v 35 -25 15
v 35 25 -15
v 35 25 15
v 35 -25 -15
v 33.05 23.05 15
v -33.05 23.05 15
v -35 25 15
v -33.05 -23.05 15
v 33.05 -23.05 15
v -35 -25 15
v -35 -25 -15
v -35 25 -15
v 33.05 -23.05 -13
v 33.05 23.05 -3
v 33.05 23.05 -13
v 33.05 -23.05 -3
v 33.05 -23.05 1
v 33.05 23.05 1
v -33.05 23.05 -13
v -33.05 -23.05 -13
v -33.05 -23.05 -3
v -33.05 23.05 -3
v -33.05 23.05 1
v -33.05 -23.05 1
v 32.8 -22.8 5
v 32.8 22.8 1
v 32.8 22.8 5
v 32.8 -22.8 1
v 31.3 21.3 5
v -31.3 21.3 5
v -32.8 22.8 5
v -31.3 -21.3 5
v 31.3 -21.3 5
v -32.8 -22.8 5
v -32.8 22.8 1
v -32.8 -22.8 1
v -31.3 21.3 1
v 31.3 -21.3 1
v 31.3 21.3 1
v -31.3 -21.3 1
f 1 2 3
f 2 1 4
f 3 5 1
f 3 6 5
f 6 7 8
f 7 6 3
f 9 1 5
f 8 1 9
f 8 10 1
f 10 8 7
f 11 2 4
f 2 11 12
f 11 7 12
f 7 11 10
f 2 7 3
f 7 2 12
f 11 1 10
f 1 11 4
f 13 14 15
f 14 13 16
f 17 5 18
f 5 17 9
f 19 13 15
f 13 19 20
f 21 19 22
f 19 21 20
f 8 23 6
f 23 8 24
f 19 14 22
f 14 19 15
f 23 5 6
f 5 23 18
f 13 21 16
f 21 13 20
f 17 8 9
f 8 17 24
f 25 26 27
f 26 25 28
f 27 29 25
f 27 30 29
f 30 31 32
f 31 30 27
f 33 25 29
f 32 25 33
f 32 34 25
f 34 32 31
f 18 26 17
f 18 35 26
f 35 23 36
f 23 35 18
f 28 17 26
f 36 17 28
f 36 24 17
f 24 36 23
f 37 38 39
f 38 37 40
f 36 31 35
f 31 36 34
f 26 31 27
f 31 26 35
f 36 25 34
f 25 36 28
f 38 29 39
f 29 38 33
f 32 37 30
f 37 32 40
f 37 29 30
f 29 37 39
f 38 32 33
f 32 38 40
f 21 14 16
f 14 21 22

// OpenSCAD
// --- Dimensions: Box ---
box_width = 70;          // Outer width (X)
box_depth = 50;          // Outer depth (Y)
box_height = 30;        // Outer height (Z)
box_wall_thick = 2;      // Wall thickness
box_floor_thick = 2;     // Floor thickness

// --- Dimensions: Lid ---
lid_plate_w = 70;        // Plate width (X)
lid_plate_d = 50;        // Plate depth (Y)
lid_plate_h = 2;         // Plate thickness (Z)
lid_lip_w = 65.6;        // Lip outer width (X)
lid_lip_d = 45.6;        // Lip outer depth (Y)
lid_lip_h = 4;           // Lip height (Z)
lid_lip_thick = 1.5;     // Lip wall thickness

// --- Layout ---
gap = 10;                // Gap between parts on print bed
$fn = 64;                // Smoothness for curves

// --- Part 1: The Box ---
// Positioned at origin (centered on X/Y)
translate(0, 0, 0) {
    difference() {
        // Main outer body
        cube([box_width, box_depth, box_height], center = true);
        
        // Hollow interior
        // We subtract a slightly larger cube to ensure clean cuts
        translate([0, 0, box_floor_thick])
            cube([box_width - 2*box_wall_thick + 0.1, 
                  box_depth - 2*box_wall_thick + 0.1, 
                  box_height], center = true);
    }
}

// --- Part 2: The Lid ---
// Printed upside down (Z=0 is the top surface of the lip)
// Placed on the +X side of the box with a gap
translate(box_width + gap, 0, 0) {
    // We rotate 180 on X so the plate sits on the bed (Z=0)
    // and the lip grows upwards from the plate.
    // However, the prompt says "printed upside down: a plate... lying on the bed"
    // This implies the plate is the bottom layer.
    
    union() {
        // The Plate (Base of the lid)
        cube([lid_plate_w, lid_plate_d, lid_plate_h], center = true);
        
        // The Lip (The part that slides into the box)
        // To print "upside down" with the plate on the bed, 
        // the lip must be built on top of the plate.
        // If the user meant the lip is the part touching the bed, 
        // they would have said "lip on the bed". 
        // "A plate... lying on the bed, with a rectangular lip on top of it"
        // means Plate is Z=0 to Z=2, Lip is Z=2 to Z=6.
        
        translate([0, 0, lid_plate_h/2 + lid_lip_h/2])
        difference() {
            // Outer volume of the lip
            cube([lid_lip_w, lid_lip_d, lid_lip_h], center = true);
            
            // Inner hollow of the lip
            cube([lid_lip_w - 2*lid_lip_thick, 
                  lid_lip_d - 2*lid_lip_thick, 
                  lid_lip_h + 0.1], center = true);
        }
    }
}

// Note on orientation: 
// The box is centered at 0,0,0. 
// The lid is translated to (box_width + gap, 0, 0).
// To ensure the box sits on the bed (Z=0), we must adjust the box translation.
// Since the box is centered at 0,0,0, the bottom is at -box_height/2.
// Let's fix the box position so it rests on Z=0.

// RE-CALCULATING BOX POSITION FOR Z=0 BASE
// (The code above is the logic, here is the corrected final assembly)

/* 
   Final Assembly Logic:
   Box: 
     Base at Z=0. 
     Center at (0, 0, box_height/2)
   Lid:
     Base at Z=0.
     Center at (box_width + gap, 0, lid_plate_h/2 + lid_lip_h/2)
*/

// --- RE-WRITTEN ASSEMBLY FOR CORRECT PRINTING ---

// 1. The Box
translate(0, 0, box_height/2)
difference() {
    cube([box_width, box_depth, box_height], center = true);
    translate([0, 0, box_floor_thick])
        cube([box_width - 2*box_wall_thick + 0.1, 
              box_depth - 2*box_wall_thick + 0.1, 
              box_height], center = true);
}

// 2. The Lid
translate(box_width + gap, 0, (lid_plate_h + lid_lip_h)/2)
union() {
    // Plate
    translate([0, 0, -lid_lip_h/2])
        cube([lid_plate_w, lid_plate_d, lid_plate_h], center = true);
    
    // Lip
    difference() {
        cube([lid_lip_w, lid_lip_d, lid_lip_h], center = true);
        cube([lid_lip_w - 2*lid_lip_thick, 
              lid_lip_d - 2*lid_lip_thick, 
              lid_lip_h + 0.1], center = true);
    }
}
